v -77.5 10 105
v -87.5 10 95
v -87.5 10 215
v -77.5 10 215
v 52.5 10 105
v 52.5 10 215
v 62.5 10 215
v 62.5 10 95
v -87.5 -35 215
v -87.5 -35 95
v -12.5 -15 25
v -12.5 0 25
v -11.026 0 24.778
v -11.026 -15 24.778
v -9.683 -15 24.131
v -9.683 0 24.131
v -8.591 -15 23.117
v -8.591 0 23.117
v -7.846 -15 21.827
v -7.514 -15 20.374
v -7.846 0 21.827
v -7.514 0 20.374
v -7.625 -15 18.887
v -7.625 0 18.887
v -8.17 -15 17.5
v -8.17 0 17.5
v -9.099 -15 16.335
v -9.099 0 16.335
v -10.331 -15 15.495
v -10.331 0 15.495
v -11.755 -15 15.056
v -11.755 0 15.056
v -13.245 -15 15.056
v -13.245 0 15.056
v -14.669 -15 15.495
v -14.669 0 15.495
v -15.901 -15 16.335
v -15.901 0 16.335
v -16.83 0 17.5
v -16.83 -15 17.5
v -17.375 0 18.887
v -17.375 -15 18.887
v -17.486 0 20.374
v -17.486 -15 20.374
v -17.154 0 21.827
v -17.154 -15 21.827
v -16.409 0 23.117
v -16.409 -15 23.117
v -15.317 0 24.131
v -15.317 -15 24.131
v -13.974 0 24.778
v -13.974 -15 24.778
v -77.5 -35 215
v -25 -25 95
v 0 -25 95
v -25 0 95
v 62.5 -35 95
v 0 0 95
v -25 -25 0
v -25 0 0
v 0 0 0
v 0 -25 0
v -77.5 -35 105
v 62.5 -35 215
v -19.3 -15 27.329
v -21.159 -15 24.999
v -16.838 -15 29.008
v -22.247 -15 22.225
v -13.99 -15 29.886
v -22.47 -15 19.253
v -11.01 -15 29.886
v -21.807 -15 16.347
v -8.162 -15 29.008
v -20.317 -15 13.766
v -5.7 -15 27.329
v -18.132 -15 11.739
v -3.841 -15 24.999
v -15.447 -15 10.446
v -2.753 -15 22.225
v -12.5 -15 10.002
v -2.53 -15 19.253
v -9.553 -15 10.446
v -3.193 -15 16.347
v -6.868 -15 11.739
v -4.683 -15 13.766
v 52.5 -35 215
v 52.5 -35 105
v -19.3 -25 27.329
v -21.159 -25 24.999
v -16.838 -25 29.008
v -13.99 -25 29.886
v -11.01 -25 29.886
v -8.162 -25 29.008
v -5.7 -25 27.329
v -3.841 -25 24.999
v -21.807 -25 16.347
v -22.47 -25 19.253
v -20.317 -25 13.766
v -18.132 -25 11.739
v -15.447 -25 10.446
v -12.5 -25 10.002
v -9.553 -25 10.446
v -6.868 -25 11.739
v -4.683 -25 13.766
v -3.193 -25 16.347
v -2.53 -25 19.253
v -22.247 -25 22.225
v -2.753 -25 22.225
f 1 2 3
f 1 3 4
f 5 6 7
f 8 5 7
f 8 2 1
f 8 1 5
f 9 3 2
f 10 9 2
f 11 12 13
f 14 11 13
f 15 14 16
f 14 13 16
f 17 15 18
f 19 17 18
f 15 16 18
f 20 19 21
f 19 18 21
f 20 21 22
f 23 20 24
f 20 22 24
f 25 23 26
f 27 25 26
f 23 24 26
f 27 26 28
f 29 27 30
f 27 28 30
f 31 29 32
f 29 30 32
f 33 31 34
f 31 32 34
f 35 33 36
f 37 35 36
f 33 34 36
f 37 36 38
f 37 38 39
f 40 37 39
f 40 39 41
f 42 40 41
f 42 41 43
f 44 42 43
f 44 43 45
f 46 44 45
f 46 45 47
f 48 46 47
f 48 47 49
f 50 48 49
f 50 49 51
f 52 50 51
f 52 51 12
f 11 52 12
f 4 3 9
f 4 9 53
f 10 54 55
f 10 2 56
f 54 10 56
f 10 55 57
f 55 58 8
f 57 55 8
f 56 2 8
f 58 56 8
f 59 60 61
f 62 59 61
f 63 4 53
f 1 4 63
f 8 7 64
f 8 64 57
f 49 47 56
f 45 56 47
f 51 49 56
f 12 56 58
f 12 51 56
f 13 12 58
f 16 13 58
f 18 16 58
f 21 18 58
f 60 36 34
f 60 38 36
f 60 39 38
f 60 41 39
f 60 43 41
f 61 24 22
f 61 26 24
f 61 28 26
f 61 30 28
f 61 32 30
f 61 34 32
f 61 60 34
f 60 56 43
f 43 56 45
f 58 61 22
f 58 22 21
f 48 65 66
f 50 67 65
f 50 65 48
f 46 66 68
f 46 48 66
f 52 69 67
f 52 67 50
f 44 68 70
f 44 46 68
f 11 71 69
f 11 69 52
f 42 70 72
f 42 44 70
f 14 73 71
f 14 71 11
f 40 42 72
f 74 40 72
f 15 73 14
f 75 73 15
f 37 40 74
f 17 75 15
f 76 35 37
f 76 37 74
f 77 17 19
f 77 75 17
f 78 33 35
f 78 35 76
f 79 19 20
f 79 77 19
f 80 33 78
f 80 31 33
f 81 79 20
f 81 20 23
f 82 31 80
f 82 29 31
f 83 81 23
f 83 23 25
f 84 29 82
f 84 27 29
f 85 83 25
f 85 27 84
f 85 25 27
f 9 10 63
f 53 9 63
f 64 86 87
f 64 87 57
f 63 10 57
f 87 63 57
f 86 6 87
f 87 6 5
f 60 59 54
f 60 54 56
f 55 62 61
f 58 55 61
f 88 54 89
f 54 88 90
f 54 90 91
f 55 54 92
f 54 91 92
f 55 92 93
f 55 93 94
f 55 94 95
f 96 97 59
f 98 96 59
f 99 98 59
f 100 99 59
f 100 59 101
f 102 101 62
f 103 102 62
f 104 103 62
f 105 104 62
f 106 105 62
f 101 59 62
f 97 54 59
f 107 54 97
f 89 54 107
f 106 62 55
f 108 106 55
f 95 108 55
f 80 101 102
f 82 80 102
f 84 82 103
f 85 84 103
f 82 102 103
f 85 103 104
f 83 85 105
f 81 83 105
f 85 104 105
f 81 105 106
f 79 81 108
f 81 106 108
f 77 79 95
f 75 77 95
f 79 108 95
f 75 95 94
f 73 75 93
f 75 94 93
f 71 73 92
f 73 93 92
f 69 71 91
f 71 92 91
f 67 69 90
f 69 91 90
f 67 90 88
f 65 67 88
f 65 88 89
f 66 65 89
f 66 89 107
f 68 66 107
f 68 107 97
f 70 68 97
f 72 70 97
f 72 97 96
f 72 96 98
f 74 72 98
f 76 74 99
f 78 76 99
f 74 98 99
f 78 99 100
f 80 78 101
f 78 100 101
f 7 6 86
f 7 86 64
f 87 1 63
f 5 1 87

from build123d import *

# Parameters (mm, degrees)
ESQUISSE1_W             = 25
ESQUISSE1_H             = 25
BOSS_EXTRU_1_DEPTH      = 95
ESQUISSE2_W             = 130
ESQUISSE2_H             = 45
BOSS_EXTRU_2_DEPTH      = 10
ESQUISSE4_W             = 10
ESQUISSE4_H             = 120
BOSS_EXTRU_3_DEPTH      = 45
ESQUISSE5_R             = 5
ENL_V_MAT_EXTRU_1_DEPTH = 235.747204456
ESQUISSE6_R             = 9.997992339
ENL_V_MAT_EXTRU_2_DEPTH = 10


with BuildPart() as part:
    # Esquisse1 → Boss.-Extru.1 (new body)
    with BuildSketch(Plane.XY):
        with Locations((-12.5, -12.5)):
            Rectangle(ESQUISSE1_W, ESQUISSE1_H)
    extrude(amount=BOSS_EXTRU_1_DEPTH)

    # Esquisse2 → Boss.-Extru.2 (add)
    with BuildSketch(Plane.XY.offset(95)):
        with Locations((-12.5, -12.5)):
            Rectangle(ESQUISSE2_W, ESQUISSE2_H)
    extrude(amount=BOSS_EXTRU_2_DEPTH)

    # Esquisse4 → Boss.-Extru.3 (add)
    with BuildSketch(Plane(origin=(0, 10, 0), x_dir=(1, 0, 0), z_dir=(0, 1, 0))):
        with Locations((-82.5, -155)):
            Rectangle(ESQUISSE4_W, ESQUISSE4_H)
        with Locations((57.5, -155)):
            Rectangle(ESQUISSE4_W, ESQUISSE4_H)
    extrude(amount=-BOSS_EXTRU_3_DEPTH)

    # Esquisse5 → Enlèv. mat.-Extru.1 (cut, through all)
    with BuildSketch(Plane(origin=(0, 0, 0), x_dir=(1, 0, 0), z_dir=(0, 1, 0))):
        with Locations(Location((-12.5, -20, 0), (0, 0, 270))):
            Circle(ESQUISSE5_R)
    extrude(amount=-ENL_V_MAT_EXTRU_1_DEPTH, mode=Mode.SUBTRACT)

    # Esquisse6 → Enlèv. mat.-Extru.2 (cut)
    with BuildSketch(Plane.XZ.offset(25)):
        with Locations(Location((-12.5, 20, 0), (0, 0, 270))):
            Circle(ESQUISSE6_R)
    extrude(amount=-ENL_V_MAT_EXTRU_2_DEPTH, mode=Mode.SUBTRACT)


solid = part.part
